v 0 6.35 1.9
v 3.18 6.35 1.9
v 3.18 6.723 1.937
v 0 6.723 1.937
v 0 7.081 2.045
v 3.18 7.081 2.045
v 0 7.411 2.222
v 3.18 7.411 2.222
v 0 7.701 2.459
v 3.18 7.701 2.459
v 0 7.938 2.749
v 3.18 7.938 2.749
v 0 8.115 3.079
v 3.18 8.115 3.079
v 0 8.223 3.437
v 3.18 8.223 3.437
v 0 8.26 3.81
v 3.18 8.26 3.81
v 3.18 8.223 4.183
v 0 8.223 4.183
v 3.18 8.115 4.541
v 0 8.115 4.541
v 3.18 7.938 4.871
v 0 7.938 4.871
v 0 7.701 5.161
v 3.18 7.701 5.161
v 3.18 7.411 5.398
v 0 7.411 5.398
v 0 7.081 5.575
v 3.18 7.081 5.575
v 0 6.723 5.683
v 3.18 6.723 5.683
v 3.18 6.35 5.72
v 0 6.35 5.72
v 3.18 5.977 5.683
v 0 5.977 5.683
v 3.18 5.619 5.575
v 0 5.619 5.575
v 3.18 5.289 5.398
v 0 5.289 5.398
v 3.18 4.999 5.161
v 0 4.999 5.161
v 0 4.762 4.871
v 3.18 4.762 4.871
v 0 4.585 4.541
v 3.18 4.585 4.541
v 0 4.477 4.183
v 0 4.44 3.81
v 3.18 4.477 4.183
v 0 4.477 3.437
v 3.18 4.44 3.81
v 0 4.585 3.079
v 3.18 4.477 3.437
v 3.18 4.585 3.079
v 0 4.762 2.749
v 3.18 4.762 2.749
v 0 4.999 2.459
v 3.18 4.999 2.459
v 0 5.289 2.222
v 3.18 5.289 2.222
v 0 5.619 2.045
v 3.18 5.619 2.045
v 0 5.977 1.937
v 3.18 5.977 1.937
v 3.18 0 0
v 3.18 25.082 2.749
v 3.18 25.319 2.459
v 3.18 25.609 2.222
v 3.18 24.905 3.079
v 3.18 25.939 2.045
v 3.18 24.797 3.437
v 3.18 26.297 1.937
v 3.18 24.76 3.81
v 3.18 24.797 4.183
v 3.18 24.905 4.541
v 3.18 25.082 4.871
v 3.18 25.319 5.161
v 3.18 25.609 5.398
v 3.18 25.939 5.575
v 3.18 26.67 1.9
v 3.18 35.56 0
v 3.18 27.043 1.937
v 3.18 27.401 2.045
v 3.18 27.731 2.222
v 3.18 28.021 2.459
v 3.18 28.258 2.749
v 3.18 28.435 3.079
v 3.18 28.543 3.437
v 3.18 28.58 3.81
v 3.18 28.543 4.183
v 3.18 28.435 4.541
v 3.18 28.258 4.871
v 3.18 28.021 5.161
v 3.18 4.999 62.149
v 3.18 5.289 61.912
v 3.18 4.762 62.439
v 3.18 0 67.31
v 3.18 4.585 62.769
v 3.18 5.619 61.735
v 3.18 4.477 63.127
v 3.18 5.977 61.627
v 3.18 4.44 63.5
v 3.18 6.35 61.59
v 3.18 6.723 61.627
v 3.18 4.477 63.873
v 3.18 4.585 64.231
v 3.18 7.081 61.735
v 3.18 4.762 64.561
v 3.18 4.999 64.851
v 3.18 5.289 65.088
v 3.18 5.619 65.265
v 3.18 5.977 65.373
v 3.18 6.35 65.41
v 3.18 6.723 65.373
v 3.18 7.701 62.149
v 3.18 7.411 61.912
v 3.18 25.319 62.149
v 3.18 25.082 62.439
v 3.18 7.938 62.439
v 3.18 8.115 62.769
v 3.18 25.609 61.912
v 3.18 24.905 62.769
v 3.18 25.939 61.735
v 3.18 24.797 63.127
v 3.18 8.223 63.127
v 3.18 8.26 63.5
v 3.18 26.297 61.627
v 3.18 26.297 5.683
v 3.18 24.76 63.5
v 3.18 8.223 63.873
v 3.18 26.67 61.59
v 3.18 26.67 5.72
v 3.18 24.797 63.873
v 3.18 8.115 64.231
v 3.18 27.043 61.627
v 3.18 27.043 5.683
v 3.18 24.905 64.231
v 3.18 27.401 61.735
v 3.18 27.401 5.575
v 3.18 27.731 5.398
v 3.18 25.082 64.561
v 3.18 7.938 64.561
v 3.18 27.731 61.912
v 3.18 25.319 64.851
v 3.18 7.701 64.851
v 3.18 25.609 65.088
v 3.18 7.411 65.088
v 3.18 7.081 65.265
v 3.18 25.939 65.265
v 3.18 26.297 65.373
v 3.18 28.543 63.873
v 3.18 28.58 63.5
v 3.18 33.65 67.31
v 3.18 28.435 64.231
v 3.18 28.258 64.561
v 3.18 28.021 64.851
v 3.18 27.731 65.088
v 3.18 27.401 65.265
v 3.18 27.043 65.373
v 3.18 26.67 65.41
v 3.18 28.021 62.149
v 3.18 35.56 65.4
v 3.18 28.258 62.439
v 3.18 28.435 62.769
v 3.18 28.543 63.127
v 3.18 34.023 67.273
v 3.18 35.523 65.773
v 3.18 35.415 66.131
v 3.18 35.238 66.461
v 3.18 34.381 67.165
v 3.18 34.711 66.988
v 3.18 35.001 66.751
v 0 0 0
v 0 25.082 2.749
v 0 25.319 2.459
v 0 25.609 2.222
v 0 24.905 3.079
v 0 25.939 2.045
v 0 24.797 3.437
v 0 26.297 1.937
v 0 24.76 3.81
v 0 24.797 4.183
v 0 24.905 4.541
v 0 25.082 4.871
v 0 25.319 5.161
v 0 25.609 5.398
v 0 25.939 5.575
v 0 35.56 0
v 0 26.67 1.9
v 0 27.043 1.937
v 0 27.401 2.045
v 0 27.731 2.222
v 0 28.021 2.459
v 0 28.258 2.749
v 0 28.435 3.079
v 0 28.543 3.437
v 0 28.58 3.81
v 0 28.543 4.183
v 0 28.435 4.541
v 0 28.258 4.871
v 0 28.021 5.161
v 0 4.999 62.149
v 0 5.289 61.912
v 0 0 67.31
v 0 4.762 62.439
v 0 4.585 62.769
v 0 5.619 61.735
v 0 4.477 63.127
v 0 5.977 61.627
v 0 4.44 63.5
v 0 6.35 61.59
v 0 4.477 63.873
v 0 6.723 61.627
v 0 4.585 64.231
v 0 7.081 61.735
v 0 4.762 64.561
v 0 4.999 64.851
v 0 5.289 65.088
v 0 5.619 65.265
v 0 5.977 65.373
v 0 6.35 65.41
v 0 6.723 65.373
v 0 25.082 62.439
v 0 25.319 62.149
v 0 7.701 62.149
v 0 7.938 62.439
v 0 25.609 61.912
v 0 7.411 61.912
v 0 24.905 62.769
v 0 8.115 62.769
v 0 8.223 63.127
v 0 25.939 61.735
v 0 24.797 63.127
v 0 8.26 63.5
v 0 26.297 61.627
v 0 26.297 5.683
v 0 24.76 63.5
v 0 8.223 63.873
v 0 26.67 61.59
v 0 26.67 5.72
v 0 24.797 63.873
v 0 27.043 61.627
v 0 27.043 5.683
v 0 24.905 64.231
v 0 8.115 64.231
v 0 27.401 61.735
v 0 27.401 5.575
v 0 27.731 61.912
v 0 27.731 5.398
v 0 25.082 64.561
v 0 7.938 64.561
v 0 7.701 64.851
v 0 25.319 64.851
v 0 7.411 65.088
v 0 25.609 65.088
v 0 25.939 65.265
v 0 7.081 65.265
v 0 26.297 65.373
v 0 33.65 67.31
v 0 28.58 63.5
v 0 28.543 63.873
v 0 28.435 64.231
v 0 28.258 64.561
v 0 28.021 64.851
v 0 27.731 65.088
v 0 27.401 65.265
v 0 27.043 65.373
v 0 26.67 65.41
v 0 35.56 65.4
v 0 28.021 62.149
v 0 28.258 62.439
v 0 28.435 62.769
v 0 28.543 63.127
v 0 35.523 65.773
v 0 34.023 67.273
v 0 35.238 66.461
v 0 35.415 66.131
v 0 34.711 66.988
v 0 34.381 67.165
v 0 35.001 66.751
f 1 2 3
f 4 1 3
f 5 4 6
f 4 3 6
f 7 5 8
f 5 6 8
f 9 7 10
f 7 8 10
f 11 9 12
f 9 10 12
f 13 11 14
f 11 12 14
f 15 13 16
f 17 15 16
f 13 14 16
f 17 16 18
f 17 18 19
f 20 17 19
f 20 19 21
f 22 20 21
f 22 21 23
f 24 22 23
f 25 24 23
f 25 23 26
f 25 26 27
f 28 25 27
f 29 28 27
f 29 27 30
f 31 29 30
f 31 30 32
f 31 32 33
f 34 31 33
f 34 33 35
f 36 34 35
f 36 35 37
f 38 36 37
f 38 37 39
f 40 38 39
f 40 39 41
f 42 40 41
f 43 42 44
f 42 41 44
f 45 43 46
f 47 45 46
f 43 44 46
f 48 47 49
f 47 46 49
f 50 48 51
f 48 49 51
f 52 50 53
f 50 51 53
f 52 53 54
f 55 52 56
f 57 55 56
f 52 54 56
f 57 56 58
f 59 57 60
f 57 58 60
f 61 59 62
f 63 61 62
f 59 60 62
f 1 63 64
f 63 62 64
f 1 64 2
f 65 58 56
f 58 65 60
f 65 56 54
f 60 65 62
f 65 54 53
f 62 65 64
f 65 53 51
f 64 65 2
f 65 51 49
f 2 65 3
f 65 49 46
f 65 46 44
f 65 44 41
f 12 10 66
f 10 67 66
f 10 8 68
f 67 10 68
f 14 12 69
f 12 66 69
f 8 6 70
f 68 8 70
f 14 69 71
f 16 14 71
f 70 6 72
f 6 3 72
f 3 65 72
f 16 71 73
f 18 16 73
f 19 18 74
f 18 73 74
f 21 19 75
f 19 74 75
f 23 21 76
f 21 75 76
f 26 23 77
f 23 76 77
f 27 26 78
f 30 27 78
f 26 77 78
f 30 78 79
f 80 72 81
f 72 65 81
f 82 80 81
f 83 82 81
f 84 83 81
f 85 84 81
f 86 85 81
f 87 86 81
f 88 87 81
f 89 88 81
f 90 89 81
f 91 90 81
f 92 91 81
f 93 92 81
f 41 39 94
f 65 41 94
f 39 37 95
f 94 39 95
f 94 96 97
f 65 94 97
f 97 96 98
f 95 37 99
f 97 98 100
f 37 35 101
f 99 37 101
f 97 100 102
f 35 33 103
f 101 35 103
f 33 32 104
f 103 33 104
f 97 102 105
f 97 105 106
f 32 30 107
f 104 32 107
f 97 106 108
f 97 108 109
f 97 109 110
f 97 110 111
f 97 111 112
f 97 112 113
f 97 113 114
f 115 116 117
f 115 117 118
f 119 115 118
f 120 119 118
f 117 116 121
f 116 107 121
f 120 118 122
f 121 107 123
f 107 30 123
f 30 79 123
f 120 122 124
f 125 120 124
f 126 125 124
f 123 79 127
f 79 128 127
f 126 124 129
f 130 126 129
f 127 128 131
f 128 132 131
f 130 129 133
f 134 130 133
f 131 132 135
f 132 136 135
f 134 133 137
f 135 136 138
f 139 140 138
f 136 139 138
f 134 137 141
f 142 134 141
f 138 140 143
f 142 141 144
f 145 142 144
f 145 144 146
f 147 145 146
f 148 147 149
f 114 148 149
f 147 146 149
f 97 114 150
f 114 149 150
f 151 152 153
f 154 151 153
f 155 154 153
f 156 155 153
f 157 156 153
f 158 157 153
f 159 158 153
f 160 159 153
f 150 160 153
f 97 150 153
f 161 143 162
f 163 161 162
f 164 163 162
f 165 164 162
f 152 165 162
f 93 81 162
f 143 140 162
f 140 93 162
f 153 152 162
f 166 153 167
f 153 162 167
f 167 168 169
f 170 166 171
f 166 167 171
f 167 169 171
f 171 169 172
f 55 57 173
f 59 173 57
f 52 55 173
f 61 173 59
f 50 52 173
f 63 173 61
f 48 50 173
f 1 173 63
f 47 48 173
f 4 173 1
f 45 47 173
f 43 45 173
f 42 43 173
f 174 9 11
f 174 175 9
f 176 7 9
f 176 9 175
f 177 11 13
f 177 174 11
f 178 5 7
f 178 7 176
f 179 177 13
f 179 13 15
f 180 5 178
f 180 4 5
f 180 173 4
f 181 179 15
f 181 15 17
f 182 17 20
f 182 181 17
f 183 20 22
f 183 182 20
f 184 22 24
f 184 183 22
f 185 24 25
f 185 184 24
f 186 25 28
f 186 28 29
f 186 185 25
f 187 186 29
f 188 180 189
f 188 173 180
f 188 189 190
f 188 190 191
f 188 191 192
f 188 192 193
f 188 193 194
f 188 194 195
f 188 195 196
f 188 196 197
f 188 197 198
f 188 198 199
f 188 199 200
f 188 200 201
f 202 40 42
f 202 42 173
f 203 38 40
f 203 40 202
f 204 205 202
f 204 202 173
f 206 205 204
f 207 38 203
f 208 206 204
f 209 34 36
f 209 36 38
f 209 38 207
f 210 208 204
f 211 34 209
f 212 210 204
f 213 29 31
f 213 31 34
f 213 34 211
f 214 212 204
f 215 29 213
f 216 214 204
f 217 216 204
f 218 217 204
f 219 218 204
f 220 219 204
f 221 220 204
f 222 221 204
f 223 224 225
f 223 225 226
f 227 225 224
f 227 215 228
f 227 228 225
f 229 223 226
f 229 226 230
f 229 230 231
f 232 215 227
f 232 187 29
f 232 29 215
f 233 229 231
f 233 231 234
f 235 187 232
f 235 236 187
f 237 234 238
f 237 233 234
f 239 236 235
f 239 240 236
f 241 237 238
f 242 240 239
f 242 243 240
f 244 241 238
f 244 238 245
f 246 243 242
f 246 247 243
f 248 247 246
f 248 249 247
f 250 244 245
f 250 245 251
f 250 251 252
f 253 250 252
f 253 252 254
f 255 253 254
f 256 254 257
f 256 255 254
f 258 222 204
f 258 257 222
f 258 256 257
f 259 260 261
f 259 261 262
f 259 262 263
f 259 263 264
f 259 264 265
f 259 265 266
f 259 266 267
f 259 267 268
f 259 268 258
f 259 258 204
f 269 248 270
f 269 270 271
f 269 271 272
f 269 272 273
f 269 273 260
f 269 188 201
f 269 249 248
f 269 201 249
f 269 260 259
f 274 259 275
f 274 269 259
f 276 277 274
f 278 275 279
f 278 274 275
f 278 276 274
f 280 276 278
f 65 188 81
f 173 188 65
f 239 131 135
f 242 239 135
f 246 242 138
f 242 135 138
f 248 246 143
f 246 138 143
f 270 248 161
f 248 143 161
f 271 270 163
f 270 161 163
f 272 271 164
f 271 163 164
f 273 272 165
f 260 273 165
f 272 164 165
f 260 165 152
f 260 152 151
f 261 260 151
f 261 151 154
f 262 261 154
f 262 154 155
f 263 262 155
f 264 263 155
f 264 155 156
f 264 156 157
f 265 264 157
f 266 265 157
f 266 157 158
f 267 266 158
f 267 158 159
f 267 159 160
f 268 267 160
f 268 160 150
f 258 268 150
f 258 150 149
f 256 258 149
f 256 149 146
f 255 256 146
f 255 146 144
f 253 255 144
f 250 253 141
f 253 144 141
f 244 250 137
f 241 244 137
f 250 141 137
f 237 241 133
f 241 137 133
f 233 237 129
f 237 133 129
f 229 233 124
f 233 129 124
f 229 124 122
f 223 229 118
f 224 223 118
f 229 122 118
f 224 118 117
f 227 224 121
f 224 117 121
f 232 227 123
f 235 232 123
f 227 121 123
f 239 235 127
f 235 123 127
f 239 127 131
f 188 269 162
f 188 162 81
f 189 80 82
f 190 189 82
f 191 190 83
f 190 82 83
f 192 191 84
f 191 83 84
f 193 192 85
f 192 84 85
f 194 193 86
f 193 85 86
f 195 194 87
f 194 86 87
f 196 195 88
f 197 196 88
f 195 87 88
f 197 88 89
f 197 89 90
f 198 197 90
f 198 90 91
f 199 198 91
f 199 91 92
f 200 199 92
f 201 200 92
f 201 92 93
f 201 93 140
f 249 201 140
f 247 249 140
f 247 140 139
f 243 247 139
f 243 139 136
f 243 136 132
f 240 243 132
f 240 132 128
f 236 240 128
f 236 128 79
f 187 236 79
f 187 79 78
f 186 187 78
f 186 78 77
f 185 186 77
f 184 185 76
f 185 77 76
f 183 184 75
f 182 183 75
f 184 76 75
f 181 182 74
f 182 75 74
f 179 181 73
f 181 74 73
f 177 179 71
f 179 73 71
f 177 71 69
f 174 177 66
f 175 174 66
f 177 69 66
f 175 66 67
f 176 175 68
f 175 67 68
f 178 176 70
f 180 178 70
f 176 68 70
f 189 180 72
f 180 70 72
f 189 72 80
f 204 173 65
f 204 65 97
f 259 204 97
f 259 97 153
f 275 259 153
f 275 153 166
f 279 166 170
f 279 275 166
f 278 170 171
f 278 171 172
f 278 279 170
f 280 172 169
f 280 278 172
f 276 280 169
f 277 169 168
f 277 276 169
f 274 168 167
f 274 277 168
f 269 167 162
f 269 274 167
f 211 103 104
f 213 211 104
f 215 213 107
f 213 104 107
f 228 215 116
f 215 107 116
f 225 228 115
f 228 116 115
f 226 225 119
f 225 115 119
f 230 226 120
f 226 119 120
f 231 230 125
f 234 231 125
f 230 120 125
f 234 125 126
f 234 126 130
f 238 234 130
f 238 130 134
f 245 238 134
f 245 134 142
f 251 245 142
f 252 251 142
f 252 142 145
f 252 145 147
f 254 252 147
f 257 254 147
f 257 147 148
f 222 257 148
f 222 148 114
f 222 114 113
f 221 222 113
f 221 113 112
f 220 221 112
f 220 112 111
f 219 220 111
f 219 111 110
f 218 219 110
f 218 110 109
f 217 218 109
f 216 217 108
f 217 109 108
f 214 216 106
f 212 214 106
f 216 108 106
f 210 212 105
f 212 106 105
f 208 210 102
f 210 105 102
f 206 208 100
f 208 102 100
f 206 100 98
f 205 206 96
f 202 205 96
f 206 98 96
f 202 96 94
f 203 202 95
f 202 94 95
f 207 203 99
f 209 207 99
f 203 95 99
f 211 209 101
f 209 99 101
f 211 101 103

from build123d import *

# Parameters (mm, degrees)
BOSS_EXTRUDE1_DEPTH = 3.18
SKETCH2_R           = 1.91
CUT_EXTRUDE4_DEPTH  = 77.192270605


with BuildPart() as part:
    # Sketch1 → Boss-Extrude1 (new body)
    with BuildSketch(Plane(origin=(0, 0, 0), x_dir=(0, 0, -1), z_dir=(1, 0, 0))):
        with BuildLine():
            Line((0, 0), (-67.31, 0))
            Line((-67.31, 0), (-67.31, 33.65))
            ThreePointArc((-67.31, 33.65), (-66.750573952, 35.000573952), (-65.4, 35.56))
            Line((-65.4, 35.56), (0, 35.56))
            Line((0, 35.56), (0, 0))
        make_face()
    extrude(amount=BOSS_EXTRUDE1_DEPTH)

    # Sketch2 → Cut-Extrude4 (cut, through all)
    with BuildSketch(Plane(origin=(3.18, 0, 0), x_dir=(0, 0, -1), z_dir=(1, 0, 0))):
        with Locations((-63.5, 26.67)):
            Circle(SKETCH2_R)
        with Locations((-63.5, 6.35)):
            Circle(SKETCH2_R)
        with Locations((-3.81, 6.35)):
            Circle(SKETCH2_R)
        with Locations((-3.81, 26.67)):
            Circle(SKETCH2_R)
    extrude(amount=-CUT_EXTRUDE4_DEPTH, mode=Mode.SUBTRACT)


solid = part.part
